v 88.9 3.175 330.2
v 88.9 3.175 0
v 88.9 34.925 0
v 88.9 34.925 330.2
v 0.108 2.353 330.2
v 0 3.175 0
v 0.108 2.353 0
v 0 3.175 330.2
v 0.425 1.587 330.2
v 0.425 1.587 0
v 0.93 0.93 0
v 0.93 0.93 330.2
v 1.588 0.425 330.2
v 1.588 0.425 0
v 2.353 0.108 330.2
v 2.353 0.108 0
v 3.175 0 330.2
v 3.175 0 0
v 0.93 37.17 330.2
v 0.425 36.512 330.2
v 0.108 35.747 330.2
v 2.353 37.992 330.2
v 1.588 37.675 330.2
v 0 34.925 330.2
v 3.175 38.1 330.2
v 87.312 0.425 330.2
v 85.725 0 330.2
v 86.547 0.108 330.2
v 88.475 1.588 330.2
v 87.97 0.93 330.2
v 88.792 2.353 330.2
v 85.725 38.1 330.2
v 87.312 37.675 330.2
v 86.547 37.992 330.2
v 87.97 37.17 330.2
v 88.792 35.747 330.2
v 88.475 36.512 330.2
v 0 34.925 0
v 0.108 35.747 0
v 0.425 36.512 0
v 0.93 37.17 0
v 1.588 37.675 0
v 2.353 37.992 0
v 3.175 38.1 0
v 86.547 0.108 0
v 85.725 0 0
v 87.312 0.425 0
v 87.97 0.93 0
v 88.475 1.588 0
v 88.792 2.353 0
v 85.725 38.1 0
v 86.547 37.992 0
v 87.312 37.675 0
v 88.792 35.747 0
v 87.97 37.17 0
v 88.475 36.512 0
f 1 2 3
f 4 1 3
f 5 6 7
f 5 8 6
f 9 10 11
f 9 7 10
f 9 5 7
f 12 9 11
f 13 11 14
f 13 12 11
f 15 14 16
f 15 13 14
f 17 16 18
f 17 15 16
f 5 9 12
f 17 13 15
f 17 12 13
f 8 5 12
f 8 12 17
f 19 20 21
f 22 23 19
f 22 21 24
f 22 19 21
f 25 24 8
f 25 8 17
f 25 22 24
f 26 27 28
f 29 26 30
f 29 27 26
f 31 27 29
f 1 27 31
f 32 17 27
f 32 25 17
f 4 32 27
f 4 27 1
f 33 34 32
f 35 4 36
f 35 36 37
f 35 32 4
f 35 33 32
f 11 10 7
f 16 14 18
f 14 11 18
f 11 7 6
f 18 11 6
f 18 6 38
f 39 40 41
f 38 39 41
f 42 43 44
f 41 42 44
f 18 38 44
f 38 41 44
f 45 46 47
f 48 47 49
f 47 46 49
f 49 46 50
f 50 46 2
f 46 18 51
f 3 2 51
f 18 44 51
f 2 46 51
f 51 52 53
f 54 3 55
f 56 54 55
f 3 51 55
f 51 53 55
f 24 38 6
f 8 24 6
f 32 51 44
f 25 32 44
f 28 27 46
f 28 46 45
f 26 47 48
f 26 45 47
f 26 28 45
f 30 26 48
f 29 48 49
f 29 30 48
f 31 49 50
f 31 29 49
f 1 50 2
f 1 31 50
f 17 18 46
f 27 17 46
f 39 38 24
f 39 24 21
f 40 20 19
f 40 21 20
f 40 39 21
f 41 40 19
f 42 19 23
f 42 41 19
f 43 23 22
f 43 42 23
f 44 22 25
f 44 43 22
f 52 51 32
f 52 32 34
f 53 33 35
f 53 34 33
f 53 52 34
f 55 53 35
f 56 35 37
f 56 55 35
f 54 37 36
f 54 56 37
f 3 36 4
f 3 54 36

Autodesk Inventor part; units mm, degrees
ref_plane "YZ Plane" through (0, 0, 0) normal (1, 0, 0) x (0, 1, 0)
ref_plane "XZ Plane" through (0, 0, 0) normal (0, 1, 0) x (-1, 0, 0)
ref_plane "XY Plane" through (0, 0, 0) normal (0, 0, 1) x (1, 0, 0)
sketch "Sketch1" plane through (0, 0, 0) normal (0, 0, 1) x (1, 0, 0)
  line L0 (0, 0) -> (88.9, 0)
  line L1 (88.9, 0) -> (88.9, 34.925)
  line L2 (85.725, 38.1) -> (3.175, 38.1)
  line L3 (0, 34.925) -> (0, 0)
  arc A0 (3.175, 38.1) -> (0, 34.925) centre (3.175, 34.925) ccw
  arc A1 (88.9, 34.925) -> (85.725, 38.1) centre (85.725, 34.925) ccw
  point P0 (88.9, 38.1)
  point P1 (0, 38.1)
  dimension "Width" = 88.9
  dimension "Height" = 38.1
  dimension "d2" = 3.175
extrude "Extrusion1" add sketch "Sketch1" along normal blind 330.2
fillet "Fillet1" radius 3.175 1 edges at (88.9, 0, 165.1)
fillet "Fillet2" radius 3.175 1 edges at (0, 0, 165.1)
properties part number "2x4x13" material "Wood (Oak)"
